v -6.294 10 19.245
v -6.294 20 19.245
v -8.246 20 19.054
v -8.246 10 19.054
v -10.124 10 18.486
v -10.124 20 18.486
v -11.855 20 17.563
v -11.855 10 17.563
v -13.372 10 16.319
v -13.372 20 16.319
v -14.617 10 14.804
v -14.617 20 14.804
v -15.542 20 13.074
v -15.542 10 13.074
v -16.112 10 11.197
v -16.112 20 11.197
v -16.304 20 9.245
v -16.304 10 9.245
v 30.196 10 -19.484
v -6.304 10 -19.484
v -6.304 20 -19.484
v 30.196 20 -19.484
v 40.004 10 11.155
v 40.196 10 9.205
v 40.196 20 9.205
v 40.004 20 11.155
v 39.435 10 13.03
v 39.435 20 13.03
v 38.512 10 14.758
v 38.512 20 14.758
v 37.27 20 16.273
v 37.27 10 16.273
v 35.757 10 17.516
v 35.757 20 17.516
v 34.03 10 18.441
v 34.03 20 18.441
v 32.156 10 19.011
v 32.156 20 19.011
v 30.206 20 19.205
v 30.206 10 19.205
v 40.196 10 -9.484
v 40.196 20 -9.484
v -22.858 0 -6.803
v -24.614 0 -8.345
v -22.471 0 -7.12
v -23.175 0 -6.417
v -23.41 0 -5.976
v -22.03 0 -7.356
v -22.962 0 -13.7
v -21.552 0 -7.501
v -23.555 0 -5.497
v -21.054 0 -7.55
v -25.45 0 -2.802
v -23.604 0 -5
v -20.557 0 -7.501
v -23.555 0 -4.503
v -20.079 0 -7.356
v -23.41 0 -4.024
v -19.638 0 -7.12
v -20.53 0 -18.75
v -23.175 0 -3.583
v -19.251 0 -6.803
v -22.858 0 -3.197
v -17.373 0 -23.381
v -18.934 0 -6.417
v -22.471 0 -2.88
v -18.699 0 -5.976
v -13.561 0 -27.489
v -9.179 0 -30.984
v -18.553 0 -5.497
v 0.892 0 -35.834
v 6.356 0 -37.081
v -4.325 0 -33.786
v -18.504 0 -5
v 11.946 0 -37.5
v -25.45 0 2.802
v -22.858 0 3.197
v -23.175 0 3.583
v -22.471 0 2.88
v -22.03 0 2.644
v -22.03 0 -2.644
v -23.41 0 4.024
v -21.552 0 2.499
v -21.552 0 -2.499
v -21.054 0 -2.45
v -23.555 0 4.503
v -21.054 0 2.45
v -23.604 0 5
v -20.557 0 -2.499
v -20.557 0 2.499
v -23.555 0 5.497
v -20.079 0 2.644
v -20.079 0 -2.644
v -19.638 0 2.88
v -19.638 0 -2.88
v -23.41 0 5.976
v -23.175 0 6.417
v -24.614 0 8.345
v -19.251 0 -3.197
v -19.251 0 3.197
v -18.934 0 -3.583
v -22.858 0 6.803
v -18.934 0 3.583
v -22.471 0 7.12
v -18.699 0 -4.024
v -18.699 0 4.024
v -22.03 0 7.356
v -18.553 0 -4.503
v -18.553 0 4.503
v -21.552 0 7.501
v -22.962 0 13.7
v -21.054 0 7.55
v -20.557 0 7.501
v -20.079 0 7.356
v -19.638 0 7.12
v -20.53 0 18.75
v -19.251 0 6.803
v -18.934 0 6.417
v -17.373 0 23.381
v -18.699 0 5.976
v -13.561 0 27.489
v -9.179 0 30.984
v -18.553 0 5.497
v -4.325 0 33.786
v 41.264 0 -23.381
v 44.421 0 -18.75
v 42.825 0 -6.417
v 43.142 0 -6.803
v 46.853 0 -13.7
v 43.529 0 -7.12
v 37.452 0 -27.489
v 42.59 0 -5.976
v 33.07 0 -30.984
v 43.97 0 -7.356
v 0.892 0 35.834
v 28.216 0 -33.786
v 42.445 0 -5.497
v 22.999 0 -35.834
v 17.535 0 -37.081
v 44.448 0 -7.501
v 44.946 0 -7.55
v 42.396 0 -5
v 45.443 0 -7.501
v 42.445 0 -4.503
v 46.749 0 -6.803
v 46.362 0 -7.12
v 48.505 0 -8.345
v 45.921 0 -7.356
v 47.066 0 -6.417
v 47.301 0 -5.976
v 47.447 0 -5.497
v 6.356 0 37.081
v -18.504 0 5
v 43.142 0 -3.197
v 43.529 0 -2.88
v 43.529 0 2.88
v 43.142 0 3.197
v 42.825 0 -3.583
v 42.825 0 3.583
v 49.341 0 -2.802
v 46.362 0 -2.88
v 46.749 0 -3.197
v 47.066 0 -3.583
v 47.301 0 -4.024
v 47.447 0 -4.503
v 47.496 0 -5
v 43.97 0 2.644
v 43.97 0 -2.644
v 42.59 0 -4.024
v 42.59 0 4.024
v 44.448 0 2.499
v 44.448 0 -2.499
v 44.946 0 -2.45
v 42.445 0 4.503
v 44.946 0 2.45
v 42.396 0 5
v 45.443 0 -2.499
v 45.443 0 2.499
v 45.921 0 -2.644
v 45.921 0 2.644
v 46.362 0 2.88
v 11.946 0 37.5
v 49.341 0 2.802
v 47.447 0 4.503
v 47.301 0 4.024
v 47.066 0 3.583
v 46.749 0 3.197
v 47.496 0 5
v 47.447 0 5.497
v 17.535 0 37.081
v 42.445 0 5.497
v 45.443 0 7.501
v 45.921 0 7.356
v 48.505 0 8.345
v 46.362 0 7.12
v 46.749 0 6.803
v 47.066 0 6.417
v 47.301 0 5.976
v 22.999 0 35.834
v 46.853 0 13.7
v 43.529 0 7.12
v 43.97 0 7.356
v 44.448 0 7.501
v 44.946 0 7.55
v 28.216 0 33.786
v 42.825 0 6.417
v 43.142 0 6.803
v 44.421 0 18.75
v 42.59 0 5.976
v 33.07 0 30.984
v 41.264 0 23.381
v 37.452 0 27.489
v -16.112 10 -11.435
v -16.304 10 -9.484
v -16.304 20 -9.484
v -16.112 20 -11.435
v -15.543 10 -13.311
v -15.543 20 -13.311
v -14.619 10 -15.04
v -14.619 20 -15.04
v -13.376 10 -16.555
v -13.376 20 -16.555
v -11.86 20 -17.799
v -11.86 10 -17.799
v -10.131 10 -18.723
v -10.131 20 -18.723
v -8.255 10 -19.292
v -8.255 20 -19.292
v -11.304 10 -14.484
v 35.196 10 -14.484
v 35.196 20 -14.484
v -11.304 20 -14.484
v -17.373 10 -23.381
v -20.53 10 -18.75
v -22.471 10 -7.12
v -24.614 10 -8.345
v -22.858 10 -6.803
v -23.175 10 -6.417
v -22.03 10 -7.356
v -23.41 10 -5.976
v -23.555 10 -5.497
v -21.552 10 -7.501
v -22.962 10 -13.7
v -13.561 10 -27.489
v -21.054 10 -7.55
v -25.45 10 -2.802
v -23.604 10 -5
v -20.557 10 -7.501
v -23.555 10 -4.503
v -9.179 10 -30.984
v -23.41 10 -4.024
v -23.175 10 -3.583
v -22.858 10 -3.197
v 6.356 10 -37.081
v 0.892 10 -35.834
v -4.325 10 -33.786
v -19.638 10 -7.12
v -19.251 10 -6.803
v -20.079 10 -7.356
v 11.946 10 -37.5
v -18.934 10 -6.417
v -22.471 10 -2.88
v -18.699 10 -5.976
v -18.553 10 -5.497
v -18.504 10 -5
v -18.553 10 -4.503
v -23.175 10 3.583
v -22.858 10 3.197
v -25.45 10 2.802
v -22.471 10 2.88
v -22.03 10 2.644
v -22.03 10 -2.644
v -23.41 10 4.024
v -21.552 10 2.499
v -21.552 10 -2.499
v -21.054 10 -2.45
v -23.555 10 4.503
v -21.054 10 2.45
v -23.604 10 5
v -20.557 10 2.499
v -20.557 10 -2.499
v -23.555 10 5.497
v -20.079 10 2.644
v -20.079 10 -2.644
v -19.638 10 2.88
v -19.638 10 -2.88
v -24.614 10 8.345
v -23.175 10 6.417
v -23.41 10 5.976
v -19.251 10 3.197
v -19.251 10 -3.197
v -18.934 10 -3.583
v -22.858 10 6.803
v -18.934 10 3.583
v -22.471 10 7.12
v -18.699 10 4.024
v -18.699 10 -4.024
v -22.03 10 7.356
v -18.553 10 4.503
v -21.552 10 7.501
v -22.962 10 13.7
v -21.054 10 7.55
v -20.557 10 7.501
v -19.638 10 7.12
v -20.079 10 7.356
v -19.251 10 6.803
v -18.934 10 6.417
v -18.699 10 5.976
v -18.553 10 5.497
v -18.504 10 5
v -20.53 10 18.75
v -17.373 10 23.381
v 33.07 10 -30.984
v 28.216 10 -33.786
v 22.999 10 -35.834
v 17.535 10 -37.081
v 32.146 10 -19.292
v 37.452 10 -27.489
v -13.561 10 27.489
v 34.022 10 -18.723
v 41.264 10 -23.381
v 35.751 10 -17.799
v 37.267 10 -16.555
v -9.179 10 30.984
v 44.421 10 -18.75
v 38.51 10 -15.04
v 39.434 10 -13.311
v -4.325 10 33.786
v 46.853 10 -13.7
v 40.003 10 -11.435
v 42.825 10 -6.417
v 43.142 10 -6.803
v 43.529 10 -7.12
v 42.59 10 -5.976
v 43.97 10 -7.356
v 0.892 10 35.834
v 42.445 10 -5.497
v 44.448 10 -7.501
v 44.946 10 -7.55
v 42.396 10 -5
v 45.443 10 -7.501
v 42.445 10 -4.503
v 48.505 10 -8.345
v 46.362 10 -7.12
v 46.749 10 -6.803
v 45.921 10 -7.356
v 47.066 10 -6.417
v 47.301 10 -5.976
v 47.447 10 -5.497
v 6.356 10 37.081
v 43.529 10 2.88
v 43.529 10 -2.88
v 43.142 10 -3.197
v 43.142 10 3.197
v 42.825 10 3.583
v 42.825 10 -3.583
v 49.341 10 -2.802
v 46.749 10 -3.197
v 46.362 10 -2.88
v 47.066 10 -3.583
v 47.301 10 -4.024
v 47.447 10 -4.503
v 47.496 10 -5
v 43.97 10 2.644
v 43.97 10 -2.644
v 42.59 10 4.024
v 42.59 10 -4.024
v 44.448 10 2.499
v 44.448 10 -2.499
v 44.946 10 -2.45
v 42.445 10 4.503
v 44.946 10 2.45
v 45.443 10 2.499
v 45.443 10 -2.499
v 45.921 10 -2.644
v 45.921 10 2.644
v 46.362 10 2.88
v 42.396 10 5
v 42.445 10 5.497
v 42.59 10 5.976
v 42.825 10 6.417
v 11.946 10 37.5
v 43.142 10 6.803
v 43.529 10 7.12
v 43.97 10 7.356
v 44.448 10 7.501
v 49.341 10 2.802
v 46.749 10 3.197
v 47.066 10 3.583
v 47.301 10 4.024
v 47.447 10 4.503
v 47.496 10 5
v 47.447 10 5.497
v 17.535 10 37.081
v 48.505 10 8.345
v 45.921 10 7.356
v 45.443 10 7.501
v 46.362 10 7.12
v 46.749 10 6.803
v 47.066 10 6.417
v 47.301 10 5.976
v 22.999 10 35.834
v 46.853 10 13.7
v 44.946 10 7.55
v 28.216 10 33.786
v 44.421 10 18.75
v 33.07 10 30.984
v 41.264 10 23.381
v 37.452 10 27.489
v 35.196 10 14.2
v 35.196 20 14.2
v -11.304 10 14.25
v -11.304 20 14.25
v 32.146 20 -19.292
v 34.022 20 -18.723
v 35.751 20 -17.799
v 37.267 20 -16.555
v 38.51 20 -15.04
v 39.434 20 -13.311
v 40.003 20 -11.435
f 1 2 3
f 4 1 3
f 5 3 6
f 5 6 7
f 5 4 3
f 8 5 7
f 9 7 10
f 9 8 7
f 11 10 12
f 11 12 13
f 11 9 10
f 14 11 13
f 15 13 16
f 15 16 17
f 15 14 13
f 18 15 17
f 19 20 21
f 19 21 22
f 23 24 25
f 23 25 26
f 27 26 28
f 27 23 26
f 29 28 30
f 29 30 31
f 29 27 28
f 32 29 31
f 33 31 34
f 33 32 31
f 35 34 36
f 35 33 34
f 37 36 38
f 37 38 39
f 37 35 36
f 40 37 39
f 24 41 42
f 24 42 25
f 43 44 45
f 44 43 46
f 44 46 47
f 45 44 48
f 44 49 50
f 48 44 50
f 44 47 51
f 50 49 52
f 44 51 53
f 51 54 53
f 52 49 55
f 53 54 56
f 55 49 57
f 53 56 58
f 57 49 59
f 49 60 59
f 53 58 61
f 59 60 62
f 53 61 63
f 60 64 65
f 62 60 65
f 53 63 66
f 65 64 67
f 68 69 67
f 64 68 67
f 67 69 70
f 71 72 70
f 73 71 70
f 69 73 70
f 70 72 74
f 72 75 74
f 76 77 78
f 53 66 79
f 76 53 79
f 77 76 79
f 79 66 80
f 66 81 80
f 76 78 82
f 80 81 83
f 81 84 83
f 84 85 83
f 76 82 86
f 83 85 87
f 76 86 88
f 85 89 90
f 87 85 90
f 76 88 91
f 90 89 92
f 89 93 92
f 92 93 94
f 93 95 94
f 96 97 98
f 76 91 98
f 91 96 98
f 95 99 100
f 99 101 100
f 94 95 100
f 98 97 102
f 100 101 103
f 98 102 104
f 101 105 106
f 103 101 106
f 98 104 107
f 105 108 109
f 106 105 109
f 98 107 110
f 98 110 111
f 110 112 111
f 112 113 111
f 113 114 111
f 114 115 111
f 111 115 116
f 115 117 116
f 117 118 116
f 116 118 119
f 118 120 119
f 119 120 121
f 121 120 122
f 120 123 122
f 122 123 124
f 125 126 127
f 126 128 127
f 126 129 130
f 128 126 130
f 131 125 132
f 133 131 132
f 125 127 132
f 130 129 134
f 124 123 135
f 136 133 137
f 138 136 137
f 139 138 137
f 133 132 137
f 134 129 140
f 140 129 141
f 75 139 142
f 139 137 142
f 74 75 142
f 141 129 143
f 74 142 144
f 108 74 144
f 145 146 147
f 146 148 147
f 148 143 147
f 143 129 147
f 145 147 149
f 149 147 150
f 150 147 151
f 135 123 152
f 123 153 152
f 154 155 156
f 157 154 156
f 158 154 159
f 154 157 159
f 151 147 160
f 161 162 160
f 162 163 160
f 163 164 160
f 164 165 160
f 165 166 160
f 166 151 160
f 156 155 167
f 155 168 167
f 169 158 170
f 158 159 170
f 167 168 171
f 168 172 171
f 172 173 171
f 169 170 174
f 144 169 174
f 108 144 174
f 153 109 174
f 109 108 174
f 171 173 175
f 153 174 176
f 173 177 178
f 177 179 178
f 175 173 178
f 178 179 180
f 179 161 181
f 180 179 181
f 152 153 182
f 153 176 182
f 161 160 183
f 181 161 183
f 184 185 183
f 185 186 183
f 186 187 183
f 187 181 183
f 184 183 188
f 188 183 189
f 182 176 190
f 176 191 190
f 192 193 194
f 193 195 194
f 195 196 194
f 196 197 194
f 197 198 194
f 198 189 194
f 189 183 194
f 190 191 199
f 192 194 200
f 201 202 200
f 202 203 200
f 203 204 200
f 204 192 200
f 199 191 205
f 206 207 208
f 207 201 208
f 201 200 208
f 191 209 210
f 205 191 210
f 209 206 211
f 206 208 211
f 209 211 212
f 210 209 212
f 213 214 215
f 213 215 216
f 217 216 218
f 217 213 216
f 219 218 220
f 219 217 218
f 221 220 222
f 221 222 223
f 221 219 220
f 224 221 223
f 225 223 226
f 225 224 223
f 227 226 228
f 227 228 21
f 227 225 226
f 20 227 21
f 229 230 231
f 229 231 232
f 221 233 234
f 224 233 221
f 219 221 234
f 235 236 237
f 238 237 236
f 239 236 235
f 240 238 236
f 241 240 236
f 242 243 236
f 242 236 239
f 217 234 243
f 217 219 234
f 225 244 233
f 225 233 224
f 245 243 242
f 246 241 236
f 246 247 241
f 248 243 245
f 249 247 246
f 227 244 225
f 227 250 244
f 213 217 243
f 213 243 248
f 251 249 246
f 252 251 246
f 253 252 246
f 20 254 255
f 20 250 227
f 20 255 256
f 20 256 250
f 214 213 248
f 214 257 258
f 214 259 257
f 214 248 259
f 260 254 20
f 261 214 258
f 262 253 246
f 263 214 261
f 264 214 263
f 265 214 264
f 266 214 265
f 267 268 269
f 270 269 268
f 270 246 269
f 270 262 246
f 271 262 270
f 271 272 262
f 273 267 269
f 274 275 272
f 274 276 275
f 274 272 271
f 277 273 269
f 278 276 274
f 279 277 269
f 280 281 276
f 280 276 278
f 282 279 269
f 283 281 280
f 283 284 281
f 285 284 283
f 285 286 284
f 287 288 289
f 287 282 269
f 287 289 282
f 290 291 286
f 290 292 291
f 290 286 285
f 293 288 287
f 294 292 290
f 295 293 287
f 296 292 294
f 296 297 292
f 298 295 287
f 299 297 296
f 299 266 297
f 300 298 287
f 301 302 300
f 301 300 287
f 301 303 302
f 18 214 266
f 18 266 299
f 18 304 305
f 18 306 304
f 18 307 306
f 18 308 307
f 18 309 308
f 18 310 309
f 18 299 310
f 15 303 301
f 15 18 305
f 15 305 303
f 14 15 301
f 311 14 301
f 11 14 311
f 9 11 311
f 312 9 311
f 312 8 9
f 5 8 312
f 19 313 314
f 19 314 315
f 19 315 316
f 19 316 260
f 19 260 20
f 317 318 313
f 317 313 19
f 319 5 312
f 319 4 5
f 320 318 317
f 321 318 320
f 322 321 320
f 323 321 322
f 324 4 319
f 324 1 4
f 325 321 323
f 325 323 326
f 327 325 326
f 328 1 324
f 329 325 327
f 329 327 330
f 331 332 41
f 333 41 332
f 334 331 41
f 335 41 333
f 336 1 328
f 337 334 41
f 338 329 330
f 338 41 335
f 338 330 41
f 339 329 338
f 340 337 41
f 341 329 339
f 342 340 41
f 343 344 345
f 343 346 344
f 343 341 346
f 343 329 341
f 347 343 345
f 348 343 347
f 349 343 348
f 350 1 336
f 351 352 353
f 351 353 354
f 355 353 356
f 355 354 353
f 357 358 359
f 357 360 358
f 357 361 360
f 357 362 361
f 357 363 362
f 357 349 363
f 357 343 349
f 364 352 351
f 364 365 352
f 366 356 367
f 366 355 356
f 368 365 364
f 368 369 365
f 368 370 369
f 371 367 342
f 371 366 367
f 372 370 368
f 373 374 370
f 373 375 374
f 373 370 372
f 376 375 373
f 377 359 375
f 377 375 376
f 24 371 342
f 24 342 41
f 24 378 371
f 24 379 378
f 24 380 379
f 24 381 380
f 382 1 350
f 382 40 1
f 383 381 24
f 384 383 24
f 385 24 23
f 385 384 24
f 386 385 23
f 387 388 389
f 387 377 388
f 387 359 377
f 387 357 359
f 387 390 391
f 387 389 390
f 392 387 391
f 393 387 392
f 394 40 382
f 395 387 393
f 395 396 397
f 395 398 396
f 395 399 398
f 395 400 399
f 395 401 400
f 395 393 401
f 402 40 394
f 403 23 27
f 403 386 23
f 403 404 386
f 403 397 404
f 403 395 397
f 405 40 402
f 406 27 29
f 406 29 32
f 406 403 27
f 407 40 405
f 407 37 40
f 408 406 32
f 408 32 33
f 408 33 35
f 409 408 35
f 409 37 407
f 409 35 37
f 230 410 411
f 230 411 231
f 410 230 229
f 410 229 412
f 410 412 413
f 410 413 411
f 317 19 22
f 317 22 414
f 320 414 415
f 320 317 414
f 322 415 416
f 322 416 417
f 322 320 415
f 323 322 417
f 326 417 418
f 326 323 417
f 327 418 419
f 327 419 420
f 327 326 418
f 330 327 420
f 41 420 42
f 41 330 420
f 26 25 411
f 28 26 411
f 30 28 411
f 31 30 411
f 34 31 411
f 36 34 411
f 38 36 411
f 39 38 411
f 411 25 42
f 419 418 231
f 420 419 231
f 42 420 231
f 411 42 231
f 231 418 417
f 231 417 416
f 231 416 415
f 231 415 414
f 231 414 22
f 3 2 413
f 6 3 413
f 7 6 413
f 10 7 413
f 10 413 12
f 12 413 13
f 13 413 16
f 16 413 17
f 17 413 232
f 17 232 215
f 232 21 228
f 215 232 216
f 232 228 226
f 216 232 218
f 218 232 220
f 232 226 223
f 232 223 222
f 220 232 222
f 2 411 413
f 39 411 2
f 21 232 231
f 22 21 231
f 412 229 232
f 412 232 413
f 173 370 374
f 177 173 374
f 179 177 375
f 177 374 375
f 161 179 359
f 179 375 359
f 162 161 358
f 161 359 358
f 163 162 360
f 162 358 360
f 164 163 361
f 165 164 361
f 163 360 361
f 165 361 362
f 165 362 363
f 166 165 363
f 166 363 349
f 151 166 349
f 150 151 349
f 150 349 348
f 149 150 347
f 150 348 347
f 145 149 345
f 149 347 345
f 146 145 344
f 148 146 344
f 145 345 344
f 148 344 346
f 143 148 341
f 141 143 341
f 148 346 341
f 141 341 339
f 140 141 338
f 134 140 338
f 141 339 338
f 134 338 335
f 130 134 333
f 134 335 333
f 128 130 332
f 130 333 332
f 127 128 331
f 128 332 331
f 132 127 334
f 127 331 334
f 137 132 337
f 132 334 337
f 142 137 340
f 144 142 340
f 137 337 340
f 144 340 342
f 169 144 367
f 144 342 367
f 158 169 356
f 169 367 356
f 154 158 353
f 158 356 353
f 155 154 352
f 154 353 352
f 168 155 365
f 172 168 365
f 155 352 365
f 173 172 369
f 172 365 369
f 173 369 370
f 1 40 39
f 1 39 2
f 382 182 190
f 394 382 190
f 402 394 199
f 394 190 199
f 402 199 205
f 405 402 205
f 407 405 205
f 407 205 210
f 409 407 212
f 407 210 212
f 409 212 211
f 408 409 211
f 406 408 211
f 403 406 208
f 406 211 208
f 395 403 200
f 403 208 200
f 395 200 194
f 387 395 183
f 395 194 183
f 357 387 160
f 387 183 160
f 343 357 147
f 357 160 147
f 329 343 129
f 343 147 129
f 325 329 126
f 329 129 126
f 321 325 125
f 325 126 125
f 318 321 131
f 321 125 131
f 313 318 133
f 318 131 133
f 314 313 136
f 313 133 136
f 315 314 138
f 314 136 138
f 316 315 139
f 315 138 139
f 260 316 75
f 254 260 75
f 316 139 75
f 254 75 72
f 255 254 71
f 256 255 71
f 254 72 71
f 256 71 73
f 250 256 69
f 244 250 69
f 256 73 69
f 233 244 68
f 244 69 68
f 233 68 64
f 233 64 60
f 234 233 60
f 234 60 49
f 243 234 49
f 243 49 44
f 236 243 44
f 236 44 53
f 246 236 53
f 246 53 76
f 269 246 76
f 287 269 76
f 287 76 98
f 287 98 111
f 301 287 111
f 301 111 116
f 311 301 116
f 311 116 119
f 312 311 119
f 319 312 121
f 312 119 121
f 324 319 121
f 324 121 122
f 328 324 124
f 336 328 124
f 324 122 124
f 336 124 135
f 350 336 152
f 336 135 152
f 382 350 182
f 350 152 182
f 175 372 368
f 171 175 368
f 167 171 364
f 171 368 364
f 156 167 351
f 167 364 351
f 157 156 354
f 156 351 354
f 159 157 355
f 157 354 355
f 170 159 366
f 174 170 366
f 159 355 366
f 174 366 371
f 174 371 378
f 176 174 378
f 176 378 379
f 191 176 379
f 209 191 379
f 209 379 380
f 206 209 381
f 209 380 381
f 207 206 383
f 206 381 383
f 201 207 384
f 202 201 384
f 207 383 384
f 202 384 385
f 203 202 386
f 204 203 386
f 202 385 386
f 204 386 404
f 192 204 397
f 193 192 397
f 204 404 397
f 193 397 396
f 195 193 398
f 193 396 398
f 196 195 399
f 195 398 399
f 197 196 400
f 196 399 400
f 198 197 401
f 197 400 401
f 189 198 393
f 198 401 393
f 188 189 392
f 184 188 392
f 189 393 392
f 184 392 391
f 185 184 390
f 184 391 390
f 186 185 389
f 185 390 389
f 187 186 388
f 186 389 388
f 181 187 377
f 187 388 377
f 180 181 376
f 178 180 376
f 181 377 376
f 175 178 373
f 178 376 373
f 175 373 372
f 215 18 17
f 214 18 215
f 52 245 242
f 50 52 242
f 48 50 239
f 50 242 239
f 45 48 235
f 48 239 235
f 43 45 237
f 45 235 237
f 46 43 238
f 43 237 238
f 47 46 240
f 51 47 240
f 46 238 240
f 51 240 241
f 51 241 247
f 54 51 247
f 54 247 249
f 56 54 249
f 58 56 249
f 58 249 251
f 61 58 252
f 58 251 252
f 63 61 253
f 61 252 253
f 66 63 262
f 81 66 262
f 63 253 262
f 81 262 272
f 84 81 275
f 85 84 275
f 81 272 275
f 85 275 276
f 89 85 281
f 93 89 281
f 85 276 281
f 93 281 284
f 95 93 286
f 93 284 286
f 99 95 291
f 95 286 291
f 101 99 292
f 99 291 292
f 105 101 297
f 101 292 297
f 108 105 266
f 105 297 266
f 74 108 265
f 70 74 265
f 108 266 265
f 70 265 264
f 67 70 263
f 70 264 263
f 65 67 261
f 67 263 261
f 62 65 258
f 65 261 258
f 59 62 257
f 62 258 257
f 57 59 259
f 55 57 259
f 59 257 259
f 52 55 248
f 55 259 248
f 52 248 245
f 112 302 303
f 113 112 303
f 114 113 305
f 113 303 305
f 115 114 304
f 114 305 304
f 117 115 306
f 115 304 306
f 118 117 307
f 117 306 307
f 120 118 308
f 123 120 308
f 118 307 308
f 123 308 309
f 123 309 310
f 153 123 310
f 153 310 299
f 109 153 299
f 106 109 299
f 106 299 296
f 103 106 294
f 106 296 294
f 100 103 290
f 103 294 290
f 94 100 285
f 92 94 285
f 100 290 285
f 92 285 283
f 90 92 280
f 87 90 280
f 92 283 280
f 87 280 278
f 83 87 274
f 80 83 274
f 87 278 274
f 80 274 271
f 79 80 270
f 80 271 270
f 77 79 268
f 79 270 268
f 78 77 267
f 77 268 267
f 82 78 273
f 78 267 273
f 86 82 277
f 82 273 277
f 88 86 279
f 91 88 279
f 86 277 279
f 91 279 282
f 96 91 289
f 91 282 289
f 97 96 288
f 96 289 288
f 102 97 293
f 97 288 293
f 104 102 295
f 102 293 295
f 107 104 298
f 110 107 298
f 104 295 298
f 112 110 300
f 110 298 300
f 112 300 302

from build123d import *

# Parameters (mm, degrees)
SKETCH1_R           = 37.5
BOSS_EXTRUDE1_DEPTH = 10
BOSS_EXTRUDE2_START = 10
BOSS_EXTRUDE2_DEPTH = 10
SKETCH3_R           = 2.55
CUT_EXTRUDE1_DEPTH  = 10


with BuildPart() as part:
    # Sketch1 → Boss-Extrude1 (new body)
    with BuildSketch(Plane(origin=(0, 0, 0), x_dir=(1, 0, 0), z_dir=(0, 1, 0))):
        with Locations(Location((11.945516858, 0, 0), (0, 0, 270))):
            Circle(SKETCH1_R)
    extrude(amount=BOSS_EXTRUDE1_DEPTH)

    # Sketch2 → Boss-Extrude2 (add)
    with BuildSketch(Plane(origin=(0, 0, 0), x_dir=(1, 0, 0), z_dir=(0, 1, 0)).offset(BOSS_EXTRUDE2_START)):
        with BuildLine():
            Line((-6.304483142, 19.484324941), (30.195516858, 19.484324941))
            ThreePointArc((30.195516858, 19.484324941), (37.26658467, 16.555392753), (40.195516858, 9.484324941))
            Line((40.195516858, 9.484324941), (40.195516858, -9.205373472))
            ThreePointArc((40.195516858, -9.205373472), (37.270385296, -16.272638614), (30.20626954, -19.205367691))
            Line((30.20626954, -19.205367691), (-6.29373046, -19.244615001))
            ThreePointArc((-6.29373046, -19.244615001), (-13.371748284, -16.319489219), (-16.304483142, -9.244620782))
            Line((-16.304483142, -9.244620782), (-16.304483142, 9.484324941))
            ThreePointArc((-16.304483142, 9.484324941), (-13.375550954, 16.555392753), (-6.304483142, 19.484324941))
        make_face()
        Polygon((-11.304483142, -14.250000016), (35.195516858, -14.200000018), (35.195516858, 14.484324941), (-11.304483142, 14.484324941), align=None, mode=Mode.SUBTRACT)
    extrude(amount=BOSS_EXTRUDE2_DEPTH)

    # Sketch3 → Cut-Extrude1 (cut)
    with BuildSketch(Plane(origin=(0, 10, 0), x_dir=(1, 0, 0), z_dir=(0, 1, 0))):
        with Locations(Location((-21.054483142, -5, 0), (0, 0, 270))):
            Circle(SKETCH3_R)
        with Locations(Location((-21.054483142, 5, 0), (0, 0, 90))):
            Circle(SKETCH3_R)
        with Locations(Location((44.945516858, -5, 0), (0, 0, 90))):
            Circle(SKETCH3_R)
        with Locations(Location((44.945516858, 5, 0), (0, 0, 270))):
            Circle(SKETCH3_R)
    extrude(amount=-CUT_EXTRUDE1_DEPTH, mode=Mode.SUBTRACT)


solid = part.part
